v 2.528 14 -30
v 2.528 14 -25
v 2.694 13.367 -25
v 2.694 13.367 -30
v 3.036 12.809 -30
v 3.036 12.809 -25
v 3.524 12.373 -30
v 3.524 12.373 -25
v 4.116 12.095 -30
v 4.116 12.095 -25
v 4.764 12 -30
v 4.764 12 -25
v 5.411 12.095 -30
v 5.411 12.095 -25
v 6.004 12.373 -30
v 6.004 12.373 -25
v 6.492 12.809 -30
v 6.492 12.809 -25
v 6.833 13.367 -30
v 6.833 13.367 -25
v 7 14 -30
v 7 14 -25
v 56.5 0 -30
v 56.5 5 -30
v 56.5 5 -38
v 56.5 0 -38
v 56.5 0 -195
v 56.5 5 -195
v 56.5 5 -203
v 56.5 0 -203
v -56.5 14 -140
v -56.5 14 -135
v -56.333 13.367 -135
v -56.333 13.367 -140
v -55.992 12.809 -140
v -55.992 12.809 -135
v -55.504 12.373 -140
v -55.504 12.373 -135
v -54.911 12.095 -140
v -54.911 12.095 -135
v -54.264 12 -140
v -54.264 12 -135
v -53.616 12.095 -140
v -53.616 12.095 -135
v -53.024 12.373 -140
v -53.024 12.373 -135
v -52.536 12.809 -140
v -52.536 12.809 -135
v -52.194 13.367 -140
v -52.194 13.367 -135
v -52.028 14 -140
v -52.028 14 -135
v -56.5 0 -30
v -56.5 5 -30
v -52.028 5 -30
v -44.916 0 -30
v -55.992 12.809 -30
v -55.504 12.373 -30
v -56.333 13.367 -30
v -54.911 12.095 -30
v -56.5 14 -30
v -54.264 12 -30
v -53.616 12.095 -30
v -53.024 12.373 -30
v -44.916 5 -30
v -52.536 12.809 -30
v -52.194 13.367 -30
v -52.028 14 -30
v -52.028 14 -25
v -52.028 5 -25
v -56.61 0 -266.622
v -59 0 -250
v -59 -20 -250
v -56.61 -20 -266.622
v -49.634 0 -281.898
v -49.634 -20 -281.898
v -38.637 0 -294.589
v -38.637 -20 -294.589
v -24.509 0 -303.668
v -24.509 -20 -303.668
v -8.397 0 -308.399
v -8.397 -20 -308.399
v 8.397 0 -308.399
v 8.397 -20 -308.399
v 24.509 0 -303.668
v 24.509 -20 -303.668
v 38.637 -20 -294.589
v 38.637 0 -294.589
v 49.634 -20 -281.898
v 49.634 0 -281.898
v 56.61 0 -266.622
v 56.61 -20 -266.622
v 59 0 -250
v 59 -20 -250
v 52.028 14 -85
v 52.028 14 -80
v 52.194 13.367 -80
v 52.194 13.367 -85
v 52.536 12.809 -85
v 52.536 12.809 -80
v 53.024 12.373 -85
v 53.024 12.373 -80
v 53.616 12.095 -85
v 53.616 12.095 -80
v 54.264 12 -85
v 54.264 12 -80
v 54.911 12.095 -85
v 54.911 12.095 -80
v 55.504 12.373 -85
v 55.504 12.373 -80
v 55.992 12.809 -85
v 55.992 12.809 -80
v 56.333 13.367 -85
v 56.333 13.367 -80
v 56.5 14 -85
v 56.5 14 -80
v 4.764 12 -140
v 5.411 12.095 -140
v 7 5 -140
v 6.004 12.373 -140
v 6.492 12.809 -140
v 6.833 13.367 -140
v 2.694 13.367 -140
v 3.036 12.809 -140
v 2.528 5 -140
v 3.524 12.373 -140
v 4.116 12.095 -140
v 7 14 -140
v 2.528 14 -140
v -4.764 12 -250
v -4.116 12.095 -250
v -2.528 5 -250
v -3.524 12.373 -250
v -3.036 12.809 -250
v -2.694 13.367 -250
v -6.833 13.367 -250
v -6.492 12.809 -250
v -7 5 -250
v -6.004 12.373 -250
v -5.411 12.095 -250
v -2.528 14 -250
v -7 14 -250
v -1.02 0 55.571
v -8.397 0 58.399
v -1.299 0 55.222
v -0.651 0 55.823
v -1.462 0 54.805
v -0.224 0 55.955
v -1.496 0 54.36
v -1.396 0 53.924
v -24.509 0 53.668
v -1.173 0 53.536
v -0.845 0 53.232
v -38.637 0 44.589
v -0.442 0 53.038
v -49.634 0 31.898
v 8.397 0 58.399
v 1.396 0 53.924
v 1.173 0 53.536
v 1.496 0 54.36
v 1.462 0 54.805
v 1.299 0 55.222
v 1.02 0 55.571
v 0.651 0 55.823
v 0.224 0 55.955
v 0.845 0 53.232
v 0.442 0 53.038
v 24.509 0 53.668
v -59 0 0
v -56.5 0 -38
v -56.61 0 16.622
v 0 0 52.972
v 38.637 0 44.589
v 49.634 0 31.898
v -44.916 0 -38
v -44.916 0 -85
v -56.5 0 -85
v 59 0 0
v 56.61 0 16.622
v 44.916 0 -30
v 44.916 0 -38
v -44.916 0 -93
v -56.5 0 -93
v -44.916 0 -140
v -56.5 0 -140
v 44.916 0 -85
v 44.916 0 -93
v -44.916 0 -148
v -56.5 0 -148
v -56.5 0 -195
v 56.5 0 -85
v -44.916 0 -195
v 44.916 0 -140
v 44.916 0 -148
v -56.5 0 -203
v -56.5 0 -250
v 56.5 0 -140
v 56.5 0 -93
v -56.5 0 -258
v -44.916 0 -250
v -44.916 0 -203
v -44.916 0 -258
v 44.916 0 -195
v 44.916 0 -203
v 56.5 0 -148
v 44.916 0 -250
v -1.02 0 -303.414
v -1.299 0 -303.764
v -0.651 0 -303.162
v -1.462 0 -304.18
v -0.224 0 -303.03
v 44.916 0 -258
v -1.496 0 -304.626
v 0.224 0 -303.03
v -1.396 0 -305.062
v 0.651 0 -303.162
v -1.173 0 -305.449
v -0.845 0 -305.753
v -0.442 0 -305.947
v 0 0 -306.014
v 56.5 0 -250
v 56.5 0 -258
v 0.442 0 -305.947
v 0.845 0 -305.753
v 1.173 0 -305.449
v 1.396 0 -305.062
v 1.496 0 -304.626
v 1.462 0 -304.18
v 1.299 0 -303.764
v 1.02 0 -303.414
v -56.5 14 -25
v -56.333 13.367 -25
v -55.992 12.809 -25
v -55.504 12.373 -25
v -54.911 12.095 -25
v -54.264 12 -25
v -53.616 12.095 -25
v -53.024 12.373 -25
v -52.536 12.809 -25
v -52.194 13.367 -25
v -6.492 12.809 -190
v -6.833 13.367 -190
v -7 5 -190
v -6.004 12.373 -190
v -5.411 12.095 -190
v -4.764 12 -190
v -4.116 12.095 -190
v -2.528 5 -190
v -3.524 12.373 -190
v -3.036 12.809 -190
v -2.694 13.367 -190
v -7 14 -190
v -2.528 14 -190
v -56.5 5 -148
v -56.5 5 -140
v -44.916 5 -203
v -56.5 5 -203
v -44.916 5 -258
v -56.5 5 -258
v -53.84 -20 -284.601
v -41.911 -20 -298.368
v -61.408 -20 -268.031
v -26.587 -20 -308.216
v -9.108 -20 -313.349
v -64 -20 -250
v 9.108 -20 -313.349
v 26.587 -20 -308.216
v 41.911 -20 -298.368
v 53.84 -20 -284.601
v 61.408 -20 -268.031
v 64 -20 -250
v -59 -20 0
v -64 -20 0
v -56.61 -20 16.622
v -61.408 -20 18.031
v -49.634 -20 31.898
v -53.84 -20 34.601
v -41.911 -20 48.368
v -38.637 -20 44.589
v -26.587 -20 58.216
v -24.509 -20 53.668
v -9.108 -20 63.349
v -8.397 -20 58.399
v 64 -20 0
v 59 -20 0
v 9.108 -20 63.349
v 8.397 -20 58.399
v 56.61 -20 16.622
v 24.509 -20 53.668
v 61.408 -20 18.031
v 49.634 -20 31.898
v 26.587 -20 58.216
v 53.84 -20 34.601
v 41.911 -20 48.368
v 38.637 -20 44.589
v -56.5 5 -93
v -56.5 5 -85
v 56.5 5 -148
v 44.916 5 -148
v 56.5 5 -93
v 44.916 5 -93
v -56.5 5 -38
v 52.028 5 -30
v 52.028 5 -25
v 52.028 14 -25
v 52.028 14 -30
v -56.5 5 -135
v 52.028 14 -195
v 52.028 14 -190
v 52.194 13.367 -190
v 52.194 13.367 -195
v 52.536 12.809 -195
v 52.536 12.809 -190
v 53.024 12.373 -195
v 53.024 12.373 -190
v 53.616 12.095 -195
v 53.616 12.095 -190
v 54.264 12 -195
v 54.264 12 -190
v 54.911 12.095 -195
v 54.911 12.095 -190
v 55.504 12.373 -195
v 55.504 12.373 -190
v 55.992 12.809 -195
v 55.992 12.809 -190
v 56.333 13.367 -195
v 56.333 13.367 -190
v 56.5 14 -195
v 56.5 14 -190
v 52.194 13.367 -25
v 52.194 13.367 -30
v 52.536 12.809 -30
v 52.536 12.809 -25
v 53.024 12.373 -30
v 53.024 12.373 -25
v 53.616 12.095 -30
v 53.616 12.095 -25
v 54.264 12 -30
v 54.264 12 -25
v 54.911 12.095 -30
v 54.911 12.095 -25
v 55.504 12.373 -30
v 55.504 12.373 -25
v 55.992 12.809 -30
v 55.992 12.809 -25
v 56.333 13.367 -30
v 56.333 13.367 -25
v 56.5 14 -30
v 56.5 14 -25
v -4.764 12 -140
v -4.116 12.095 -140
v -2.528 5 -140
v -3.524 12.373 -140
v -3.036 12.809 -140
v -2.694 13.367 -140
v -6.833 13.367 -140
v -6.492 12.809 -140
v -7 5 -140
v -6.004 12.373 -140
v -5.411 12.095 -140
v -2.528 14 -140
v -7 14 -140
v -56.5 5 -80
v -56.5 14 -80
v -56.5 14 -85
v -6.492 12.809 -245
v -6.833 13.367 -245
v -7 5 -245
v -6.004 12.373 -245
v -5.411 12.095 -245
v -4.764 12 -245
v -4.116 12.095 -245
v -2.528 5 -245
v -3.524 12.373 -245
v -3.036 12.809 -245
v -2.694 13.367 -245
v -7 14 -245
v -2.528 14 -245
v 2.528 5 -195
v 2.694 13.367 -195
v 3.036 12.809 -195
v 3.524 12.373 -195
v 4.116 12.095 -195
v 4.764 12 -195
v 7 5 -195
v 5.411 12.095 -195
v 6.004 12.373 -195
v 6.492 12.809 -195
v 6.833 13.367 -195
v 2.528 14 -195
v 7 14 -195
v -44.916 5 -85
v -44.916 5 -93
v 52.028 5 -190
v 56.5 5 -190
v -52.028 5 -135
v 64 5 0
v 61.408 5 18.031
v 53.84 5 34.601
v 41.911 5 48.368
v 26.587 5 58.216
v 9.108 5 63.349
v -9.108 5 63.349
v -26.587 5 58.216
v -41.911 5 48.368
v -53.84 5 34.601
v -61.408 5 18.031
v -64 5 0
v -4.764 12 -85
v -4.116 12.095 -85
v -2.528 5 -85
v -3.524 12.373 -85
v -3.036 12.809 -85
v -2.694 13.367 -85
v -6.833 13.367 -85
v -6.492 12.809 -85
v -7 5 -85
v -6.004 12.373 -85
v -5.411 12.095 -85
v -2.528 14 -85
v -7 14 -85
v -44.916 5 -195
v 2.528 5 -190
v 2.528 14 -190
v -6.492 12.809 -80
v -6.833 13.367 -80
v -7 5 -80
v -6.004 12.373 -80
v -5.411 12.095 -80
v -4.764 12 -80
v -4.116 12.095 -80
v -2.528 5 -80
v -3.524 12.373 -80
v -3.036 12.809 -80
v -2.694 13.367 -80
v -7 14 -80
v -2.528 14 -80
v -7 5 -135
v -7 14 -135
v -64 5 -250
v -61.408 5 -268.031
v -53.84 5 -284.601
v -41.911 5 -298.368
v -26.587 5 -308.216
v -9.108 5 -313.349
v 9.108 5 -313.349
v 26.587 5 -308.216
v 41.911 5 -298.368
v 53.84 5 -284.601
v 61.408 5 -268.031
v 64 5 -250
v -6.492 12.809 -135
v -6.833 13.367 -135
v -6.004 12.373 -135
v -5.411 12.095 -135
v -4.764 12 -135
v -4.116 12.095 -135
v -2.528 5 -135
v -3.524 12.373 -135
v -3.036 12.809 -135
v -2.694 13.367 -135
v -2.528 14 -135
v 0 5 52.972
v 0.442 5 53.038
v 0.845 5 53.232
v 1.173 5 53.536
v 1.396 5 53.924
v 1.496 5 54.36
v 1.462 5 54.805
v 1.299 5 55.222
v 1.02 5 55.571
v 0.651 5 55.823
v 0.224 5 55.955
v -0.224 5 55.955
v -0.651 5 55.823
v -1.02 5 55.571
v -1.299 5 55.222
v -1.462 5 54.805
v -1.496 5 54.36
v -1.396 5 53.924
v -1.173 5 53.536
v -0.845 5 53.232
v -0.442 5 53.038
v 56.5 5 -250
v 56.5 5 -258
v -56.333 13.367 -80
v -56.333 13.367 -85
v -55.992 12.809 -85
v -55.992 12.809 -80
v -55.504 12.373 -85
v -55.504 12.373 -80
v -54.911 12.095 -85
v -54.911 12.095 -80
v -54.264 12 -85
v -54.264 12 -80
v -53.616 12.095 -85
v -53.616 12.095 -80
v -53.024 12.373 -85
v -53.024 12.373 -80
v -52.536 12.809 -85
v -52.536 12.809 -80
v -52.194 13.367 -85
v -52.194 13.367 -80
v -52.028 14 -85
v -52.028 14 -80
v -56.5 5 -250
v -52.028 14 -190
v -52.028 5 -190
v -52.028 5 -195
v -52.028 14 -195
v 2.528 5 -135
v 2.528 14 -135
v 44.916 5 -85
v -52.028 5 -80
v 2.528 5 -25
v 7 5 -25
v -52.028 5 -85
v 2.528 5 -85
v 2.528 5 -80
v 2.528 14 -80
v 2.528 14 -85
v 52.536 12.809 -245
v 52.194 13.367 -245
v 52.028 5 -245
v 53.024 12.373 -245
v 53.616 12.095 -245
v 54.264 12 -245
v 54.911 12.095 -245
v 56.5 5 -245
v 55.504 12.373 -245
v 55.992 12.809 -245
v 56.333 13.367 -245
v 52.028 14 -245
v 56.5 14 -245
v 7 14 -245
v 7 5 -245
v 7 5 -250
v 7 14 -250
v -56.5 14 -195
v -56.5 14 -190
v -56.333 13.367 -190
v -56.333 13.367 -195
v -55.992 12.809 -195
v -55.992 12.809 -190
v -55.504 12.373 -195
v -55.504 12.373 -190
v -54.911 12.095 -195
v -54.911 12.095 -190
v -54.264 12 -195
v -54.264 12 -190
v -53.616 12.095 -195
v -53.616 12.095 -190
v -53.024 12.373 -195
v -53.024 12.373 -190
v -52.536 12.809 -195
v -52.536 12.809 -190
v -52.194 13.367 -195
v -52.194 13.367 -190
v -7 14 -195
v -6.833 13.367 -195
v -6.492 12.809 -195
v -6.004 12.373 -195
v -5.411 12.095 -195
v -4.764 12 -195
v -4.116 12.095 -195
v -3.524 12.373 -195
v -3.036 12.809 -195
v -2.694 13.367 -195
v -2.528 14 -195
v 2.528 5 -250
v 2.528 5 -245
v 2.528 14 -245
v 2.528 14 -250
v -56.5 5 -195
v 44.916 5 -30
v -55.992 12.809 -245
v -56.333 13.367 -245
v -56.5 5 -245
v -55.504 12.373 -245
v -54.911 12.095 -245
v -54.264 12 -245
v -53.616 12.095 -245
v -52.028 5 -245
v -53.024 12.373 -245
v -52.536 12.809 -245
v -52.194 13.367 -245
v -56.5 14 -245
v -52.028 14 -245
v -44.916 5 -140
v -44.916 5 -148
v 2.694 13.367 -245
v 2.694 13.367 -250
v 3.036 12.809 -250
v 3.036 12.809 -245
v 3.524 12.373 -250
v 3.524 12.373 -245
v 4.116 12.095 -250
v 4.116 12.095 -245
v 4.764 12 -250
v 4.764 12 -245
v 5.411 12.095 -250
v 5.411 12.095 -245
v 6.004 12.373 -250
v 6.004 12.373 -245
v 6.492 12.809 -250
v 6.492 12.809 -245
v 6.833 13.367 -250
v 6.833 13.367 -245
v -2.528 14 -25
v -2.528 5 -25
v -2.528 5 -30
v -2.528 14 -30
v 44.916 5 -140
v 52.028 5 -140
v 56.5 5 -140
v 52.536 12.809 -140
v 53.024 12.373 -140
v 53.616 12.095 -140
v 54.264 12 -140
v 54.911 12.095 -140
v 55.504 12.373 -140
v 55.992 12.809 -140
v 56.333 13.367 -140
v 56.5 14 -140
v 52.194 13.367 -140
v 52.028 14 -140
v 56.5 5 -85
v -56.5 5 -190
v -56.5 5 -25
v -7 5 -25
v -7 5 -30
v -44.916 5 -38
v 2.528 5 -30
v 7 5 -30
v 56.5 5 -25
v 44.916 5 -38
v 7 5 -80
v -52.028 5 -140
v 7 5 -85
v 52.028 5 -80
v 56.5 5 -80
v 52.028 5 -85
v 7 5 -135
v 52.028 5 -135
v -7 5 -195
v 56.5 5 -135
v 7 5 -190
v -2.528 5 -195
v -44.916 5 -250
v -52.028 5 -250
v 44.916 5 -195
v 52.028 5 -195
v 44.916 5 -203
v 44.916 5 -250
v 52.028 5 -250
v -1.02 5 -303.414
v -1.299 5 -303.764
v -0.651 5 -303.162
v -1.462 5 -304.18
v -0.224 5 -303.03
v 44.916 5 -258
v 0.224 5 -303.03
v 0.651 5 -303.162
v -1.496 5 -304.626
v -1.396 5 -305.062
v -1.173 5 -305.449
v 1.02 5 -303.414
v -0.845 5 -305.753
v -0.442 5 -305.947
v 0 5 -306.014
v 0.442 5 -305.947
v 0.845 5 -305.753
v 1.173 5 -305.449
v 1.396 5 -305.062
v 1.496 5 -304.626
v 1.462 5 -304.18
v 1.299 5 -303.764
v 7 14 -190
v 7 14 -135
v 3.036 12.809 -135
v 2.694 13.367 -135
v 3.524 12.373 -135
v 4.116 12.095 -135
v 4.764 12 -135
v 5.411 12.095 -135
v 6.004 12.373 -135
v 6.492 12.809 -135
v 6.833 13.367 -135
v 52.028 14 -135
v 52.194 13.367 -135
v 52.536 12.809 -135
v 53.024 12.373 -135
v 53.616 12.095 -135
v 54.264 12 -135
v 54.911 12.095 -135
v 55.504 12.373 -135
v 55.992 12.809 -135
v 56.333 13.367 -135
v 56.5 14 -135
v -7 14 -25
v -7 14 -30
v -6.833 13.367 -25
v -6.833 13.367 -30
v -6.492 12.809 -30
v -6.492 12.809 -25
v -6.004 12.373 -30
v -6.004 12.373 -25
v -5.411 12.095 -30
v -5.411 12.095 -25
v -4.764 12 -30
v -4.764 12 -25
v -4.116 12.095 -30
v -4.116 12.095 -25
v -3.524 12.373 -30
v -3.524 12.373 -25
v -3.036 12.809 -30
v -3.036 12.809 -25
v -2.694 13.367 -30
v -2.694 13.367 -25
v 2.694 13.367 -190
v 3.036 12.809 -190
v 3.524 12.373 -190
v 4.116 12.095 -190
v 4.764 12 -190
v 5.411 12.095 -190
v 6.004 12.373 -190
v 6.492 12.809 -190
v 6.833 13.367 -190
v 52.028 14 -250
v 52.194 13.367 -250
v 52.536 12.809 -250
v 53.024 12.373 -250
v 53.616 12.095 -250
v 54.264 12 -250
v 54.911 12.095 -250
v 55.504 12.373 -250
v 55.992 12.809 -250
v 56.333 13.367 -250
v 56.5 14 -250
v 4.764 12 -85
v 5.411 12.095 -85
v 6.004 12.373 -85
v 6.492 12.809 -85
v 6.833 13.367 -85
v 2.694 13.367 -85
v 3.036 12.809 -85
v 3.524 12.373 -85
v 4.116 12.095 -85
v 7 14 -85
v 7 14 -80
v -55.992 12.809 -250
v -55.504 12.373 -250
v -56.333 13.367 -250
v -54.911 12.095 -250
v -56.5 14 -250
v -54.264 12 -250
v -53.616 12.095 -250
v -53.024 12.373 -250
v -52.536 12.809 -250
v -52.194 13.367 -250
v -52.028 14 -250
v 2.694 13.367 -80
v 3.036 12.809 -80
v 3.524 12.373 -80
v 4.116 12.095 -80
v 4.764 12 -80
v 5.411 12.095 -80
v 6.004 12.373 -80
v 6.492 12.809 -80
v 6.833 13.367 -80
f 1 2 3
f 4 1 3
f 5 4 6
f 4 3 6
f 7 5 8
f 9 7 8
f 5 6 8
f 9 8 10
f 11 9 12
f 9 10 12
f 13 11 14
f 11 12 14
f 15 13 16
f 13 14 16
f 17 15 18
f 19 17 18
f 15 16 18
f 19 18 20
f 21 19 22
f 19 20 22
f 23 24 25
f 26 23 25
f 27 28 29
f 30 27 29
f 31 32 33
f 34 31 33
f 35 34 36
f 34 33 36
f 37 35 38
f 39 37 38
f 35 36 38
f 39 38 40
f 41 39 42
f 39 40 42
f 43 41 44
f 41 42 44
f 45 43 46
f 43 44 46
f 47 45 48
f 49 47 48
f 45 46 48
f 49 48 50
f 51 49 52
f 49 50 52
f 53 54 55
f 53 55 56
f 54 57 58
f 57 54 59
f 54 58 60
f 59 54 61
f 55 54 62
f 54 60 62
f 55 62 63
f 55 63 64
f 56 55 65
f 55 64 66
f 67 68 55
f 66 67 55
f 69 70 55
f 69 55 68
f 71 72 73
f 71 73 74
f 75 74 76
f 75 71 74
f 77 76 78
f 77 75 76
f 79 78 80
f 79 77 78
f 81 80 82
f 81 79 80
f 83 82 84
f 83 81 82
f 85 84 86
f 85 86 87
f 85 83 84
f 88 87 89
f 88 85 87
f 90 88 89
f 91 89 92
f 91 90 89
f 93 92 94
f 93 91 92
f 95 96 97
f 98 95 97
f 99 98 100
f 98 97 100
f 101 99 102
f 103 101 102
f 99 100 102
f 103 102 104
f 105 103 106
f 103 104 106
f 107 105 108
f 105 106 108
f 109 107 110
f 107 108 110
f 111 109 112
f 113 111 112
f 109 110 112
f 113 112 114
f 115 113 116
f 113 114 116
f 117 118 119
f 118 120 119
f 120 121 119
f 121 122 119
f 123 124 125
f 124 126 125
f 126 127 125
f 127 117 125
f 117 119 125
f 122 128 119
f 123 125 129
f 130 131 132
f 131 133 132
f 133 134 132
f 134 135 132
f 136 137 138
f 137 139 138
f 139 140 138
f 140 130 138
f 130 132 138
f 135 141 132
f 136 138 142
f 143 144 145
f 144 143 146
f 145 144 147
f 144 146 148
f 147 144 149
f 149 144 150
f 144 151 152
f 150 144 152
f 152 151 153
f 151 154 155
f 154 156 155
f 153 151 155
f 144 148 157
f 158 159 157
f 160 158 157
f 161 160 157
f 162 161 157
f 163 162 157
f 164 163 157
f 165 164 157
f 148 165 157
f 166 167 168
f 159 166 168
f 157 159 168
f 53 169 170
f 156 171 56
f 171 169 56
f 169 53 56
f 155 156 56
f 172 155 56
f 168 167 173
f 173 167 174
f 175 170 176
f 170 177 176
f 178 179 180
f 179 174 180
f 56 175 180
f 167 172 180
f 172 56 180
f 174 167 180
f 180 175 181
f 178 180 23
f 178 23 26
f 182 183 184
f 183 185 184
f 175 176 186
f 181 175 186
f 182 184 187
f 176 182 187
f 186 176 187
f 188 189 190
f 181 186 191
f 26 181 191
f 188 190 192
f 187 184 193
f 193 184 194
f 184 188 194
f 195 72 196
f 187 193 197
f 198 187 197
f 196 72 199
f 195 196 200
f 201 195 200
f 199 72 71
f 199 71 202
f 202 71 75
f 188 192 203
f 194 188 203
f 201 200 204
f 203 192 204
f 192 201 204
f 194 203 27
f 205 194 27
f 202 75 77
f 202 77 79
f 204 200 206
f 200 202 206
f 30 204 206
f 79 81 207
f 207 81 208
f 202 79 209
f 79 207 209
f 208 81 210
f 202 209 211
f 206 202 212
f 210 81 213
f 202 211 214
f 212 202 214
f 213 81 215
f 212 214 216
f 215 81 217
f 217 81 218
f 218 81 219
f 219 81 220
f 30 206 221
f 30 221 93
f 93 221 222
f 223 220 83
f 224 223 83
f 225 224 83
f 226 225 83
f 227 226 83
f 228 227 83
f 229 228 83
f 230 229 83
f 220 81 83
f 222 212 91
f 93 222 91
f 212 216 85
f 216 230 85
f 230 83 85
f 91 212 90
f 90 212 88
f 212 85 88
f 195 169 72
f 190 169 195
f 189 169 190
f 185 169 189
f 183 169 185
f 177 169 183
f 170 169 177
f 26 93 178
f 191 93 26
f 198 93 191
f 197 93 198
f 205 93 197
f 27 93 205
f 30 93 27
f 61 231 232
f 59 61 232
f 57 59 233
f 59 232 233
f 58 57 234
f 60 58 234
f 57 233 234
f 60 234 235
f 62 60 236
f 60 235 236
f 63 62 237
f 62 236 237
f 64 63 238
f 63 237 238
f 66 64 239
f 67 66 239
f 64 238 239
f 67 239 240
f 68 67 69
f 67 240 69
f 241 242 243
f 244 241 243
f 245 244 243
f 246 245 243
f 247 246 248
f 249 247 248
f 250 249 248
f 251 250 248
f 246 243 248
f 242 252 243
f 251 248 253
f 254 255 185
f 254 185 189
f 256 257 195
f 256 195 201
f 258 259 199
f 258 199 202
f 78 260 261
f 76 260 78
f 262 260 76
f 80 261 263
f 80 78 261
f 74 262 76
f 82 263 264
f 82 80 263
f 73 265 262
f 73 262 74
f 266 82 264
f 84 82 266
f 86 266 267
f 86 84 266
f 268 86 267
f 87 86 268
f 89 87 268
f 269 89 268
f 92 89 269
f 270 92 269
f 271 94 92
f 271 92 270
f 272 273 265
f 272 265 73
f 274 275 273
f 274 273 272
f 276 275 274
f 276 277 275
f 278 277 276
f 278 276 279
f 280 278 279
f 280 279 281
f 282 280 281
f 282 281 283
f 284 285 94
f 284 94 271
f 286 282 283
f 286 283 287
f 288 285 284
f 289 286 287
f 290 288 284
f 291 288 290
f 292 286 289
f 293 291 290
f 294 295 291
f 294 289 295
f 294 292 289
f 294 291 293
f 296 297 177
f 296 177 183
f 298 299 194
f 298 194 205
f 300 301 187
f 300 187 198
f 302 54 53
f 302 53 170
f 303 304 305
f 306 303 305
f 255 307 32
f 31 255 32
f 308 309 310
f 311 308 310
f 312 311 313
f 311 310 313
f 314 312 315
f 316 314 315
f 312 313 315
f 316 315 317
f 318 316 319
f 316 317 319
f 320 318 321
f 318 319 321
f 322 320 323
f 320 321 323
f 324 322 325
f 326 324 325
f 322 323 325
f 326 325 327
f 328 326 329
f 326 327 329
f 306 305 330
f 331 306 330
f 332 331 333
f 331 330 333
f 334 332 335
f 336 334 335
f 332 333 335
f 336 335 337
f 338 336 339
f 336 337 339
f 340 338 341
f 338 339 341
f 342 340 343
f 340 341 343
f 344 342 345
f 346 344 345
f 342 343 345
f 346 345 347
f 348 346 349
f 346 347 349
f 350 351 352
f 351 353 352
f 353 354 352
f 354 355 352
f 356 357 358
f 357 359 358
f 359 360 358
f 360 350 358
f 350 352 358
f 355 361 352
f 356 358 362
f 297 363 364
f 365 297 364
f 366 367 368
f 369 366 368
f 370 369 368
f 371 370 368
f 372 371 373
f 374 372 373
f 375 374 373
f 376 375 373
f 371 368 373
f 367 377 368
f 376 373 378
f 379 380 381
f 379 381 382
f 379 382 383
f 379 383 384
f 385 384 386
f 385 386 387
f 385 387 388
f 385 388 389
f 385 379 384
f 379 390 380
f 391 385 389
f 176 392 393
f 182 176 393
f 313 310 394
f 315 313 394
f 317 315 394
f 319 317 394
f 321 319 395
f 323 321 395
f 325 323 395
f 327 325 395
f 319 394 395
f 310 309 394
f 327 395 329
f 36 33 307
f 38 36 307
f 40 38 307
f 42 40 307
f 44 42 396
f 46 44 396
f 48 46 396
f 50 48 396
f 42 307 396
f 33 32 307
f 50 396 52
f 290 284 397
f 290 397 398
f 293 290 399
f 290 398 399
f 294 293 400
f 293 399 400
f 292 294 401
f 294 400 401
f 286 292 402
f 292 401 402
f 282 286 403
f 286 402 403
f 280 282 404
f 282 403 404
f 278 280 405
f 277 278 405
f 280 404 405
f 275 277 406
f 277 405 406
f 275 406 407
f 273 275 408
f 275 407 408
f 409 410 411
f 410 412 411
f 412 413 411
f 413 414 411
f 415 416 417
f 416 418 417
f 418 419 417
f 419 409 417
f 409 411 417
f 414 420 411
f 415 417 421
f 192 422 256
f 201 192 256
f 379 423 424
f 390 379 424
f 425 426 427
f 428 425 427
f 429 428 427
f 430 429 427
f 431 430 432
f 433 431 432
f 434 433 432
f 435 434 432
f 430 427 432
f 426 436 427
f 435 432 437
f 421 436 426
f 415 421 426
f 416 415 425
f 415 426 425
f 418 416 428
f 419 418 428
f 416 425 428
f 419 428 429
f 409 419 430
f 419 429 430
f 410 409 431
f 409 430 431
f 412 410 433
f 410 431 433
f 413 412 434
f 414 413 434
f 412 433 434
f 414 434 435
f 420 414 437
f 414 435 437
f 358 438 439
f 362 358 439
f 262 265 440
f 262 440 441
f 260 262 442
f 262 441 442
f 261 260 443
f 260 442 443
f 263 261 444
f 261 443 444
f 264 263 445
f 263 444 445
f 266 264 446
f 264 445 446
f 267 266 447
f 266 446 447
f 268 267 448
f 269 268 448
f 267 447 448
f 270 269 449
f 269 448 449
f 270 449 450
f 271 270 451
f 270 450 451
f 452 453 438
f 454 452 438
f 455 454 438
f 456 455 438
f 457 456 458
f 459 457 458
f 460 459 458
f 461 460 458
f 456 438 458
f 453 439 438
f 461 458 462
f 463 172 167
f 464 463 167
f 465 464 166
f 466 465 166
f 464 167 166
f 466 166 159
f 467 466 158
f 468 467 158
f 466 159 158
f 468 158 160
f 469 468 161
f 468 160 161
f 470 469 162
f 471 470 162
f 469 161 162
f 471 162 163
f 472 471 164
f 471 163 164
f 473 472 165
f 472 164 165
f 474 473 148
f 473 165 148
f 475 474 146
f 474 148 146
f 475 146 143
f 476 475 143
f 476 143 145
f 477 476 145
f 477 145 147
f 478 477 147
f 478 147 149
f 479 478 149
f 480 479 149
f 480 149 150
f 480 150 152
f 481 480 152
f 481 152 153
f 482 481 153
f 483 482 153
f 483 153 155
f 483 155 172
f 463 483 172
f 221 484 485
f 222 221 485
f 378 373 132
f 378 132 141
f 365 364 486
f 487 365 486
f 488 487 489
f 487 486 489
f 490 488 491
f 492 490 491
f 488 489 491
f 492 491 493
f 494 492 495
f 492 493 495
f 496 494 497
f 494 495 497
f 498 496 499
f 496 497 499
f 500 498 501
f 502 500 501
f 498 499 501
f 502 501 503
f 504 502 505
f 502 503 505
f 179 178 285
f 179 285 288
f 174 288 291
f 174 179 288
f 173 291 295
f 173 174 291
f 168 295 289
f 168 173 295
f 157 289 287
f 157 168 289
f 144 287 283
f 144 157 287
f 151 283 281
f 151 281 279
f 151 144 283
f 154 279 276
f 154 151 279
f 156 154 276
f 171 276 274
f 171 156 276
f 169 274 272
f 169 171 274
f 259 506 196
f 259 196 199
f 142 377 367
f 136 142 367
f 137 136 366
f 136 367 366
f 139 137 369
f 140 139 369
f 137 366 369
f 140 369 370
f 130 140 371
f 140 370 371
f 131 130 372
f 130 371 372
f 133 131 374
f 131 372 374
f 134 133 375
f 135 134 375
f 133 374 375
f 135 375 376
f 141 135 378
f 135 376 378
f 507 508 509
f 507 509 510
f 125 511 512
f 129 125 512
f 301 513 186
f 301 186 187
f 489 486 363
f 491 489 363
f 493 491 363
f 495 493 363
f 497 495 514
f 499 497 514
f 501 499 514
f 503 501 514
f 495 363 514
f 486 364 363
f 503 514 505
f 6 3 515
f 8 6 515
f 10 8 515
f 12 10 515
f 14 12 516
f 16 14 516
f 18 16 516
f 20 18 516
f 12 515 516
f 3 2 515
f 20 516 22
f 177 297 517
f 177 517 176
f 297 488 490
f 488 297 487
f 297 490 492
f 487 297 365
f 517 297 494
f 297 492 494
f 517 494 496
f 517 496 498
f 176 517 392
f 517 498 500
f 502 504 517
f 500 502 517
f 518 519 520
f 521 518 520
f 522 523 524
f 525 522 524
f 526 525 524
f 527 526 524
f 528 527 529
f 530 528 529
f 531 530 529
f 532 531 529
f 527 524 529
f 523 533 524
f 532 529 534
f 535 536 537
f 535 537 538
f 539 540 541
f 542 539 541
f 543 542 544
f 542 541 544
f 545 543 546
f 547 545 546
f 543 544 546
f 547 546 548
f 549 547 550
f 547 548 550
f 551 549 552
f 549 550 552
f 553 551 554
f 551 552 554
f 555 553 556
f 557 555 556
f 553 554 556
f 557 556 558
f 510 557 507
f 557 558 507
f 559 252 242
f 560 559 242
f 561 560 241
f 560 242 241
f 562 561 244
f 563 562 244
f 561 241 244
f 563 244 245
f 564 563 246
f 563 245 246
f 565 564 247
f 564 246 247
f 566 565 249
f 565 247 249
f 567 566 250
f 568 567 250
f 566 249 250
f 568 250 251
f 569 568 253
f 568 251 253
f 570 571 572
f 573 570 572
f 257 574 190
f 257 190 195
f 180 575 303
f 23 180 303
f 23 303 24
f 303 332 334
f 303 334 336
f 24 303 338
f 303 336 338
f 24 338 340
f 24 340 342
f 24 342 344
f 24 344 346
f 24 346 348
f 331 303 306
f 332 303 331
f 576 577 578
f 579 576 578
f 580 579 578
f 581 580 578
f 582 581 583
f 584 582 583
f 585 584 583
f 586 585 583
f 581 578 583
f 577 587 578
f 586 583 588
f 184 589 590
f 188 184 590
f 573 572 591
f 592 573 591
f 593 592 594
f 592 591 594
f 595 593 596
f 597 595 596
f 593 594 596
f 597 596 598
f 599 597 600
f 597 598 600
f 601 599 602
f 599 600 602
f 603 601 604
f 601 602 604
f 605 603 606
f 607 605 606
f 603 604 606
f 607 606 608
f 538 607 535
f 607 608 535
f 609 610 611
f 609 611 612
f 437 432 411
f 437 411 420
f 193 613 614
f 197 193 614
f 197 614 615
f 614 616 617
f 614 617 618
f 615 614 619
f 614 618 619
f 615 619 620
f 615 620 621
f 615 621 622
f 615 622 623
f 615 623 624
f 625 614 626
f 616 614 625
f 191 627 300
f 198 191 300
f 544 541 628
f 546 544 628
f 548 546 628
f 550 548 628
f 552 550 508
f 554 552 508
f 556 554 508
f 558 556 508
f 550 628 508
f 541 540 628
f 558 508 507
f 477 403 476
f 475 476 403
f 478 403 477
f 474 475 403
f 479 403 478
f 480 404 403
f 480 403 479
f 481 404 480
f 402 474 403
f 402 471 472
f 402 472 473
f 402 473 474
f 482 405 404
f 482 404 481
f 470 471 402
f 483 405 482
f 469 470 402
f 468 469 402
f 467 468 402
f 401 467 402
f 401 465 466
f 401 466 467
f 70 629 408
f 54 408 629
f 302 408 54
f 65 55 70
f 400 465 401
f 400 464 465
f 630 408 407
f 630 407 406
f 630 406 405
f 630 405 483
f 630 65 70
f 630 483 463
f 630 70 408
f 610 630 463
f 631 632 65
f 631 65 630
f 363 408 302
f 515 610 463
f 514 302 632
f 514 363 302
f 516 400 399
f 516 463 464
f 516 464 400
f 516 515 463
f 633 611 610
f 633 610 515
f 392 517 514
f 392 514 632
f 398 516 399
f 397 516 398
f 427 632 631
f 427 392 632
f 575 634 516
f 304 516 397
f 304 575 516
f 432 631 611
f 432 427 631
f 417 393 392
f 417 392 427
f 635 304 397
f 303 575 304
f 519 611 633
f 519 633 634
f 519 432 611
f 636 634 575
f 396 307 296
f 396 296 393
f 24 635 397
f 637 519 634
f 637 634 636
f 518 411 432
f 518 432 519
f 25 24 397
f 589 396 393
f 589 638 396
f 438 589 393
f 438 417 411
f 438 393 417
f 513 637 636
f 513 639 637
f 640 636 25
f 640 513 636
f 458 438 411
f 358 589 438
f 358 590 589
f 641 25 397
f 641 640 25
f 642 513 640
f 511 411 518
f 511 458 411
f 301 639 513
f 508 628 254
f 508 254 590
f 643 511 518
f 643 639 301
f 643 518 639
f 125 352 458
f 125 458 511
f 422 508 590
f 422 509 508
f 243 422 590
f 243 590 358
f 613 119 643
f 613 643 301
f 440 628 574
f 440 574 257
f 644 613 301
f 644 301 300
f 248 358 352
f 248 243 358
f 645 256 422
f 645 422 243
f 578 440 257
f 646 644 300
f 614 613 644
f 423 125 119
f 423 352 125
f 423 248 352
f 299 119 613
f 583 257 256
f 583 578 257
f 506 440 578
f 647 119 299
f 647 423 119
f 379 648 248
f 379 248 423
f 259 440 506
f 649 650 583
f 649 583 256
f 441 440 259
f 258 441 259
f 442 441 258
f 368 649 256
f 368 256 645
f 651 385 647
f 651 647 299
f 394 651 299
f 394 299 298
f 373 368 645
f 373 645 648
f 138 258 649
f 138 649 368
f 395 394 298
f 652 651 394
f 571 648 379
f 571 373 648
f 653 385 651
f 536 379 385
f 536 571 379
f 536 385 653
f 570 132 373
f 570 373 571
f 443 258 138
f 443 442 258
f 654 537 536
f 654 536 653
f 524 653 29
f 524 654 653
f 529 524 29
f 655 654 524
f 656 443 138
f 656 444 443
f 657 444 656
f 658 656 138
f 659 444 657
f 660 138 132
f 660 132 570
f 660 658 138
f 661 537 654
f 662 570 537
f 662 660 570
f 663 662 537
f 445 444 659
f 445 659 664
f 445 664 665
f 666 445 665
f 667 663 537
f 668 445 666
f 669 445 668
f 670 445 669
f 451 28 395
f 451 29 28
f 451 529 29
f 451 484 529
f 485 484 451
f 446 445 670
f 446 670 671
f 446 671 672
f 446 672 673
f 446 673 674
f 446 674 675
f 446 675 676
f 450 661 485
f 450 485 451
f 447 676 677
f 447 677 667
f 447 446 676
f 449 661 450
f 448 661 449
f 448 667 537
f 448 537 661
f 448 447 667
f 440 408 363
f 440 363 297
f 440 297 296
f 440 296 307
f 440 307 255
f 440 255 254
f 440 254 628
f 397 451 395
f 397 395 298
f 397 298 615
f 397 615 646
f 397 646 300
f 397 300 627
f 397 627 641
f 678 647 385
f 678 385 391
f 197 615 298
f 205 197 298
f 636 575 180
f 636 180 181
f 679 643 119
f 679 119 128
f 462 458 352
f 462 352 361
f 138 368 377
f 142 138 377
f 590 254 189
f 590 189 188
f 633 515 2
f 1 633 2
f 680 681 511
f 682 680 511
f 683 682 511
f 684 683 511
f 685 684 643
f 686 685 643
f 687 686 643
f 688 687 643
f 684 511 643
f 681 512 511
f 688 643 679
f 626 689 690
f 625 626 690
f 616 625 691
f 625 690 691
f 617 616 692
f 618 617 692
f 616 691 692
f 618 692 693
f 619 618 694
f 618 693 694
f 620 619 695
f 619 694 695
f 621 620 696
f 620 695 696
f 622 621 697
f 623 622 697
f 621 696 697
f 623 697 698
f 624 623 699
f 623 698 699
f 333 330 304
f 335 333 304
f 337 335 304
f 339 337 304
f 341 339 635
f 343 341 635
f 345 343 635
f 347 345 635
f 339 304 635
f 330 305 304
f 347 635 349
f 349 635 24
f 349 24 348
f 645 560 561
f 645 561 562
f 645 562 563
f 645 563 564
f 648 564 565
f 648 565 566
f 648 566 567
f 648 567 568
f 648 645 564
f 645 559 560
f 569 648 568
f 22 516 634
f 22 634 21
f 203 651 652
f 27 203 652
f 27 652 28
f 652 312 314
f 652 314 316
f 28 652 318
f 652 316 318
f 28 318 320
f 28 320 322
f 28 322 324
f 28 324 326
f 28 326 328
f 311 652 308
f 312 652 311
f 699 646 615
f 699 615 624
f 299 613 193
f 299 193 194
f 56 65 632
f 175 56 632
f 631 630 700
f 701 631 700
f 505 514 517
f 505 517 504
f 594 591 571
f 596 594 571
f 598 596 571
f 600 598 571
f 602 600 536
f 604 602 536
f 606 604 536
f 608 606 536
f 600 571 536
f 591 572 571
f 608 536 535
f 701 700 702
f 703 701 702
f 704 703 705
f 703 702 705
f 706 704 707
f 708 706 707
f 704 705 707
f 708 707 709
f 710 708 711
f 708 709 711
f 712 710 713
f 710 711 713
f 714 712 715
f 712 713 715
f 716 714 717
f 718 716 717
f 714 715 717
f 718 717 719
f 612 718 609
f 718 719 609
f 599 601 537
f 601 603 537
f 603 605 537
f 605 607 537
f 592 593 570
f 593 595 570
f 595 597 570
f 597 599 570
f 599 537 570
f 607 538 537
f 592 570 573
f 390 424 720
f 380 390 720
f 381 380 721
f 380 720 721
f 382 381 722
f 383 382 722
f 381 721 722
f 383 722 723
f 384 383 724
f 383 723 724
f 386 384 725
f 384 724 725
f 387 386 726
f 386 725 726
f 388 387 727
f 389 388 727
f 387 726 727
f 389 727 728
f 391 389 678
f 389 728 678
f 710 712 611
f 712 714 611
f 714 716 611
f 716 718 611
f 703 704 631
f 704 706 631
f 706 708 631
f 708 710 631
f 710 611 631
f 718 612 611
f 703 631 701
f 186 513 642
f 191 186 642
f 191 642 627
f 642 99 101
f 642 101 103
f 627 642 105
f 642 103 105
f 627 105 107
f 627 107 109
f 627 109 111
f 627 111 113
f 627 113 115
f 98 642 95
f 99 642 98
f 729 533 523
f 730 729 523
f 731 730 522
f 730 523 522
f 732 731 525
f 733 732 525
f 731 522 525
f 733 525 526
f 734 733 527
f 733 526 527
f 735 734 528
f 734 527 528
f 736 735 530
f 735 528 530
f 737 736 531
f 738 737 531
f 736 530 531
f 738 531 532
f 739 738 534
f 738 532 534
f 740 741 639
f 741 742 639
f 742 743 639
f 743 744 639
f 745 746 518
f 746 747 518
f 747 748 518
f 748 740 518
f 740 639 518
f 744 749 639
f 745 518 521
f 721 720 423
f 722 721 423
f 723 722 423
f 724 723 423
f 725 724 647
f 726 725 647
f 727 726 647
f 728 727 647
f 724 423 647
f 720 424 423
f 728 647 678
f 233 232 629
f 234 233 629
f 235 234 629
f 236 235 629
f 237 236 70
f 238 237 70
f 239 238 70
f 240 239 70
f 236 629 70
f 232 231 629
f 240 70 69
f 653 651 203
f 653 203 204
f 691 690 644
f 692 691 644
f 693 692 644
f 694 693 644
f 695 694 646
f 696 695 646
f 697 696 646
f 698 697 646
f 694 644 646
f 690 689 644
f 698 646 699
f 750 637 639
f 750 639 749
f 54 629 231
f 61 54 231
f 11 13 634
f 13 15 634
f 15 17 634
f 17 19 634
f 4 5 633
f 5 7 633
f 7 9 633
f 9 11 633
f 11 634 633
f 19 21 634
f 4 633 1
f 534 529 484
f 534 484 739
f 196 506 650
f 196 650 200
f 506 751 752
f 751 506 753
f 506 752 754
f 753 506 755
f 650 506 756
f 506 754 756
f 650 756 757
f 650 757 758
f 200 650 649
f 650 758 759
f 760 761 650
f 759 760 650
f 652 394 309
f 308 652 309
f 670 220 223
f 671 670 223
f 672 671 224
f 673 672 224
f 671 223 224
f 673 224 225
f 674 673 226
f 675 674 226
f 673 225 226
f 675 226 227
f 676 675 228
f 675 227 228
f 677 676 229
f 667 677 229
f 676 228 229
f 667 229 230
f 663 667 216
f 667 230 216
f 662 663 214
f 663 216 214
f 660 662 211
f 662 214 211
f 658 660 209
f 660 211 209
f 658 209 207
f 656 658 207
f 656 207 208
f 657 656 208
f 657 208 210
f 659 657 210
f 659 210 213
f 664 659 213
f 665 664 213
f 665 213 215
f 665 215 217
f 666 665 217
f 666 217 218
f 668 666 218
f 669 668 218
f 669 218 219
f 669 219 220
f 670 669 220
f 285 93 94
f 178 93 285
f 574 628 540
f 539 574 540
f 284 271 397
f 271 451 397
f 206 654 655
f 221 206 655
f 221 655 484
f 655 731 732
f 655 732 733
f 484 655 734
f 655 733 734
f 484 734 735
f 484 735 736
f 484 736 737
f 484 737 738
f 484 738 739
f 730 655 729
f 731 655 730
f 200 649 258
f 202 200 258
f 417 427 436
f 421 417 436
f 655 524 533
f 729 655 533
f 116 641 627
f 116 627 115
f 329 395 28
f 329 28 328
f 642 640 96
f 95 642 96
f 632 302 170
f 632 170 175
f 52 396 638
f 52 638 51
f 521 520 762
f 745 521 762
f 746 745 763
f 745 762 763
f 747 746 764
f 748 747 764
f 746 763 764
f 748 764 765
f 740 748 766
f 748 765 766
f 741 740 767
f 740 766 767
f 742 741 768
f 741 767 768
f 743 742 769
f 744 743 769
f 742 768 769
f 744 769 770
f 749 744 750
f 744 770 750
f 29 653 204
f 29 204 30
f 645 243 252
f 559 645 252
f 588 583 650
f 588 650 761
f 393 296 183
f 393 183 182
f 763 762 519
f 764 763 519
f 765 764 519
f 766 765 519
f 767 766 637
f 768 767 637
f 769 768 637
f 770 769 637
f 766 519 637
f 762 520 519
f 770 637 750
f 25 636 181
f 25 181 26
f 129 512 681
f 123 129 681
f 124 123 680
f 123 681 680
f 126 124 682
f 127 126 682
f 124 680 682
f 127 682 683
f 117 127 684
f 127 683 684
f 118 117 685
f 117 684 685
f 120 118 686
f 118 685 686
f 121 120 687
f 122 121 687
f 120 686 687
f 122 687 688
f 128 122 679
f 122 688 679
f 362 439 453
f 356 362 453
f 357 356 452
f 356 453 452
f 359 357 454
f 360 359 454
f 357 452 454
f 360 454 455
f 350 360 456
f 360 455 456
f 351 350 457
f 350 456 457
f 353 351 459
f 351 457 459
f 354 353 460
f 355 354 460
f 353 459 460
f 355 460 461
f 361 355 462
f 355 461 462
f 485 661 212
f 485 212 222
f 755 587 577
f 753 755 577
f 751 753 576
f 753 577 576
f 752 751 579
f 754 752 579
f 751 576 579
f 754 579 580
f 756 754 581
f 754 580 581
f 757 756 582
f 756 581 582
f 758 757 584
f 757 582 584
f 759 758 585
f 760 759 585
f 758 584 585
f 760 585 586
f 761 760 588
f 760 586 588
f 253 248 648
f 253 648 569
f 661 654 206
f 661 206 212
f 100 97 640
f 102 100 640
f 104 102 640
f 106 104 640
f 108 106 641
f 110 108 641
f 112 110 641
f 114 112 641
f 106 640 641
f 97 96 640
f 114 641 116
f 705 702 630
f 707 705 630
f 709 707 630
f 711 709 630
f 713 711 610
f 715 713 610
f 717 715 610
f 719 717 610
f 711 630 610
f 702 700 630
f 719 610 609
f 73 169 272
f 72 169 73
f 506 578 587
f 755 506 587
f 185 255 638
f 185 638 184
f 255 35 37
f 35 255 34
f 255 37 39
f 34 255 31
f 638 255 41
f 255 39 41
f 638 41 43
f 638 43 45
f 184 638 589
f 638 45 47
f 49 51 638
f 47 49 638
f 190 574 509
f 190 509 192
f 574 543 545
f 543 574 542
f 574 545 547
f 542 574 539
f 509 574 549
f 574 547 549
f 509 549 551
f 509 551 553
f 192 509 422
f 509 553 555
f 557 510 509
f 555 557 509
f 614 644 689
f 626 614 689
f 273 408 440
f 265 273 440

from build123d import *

# Parameters (mm, degrees)
BOSS_EXTRUDE1_DEPTH = 5
SKETCH2_W           = 9
SKETCH2_H           = 5
SKETCH2_W_2         = 18
BOSS_EXTRUDE2_DEPTH = 9
SKETCH3_W           = 1.5
SKETCH3_H           = 9
SKETCH3_W_2         = 3.027864045
SKETCH3_W_3         = 2
SKETCH3_W_4         = 5.05572809
CUT_EXTRUDE1_DEPTH  = 228
BOSS_EXTRUDE3_DEPTH = 20
SKETCH5_W           = 11.583853266
SKETCH5_H           = 8
CUT_EXTRUDE3_DEPTH  = 20
SKETCH6_R           = 1.5
CUT_EXTRUDE5_DEPTH  = 25


with BuildPart() as part:
    # Sketch1 → Boss-Extrude1 (new body)
    with BuildSketch(Plane(origin=(0, 0, 0), x_dir=(1, 0, 0), z_dir=(0, 1, 0))):
        with BuildLine():
            Line((-64, 250), (-64, 0))
            ThreePointArc((-64, 0), (0, -64), (64, 0))
            Line((64, 0), (64, 250))
            ThreePointArc((64, 250), (0, 314), (-64, 250))
        make_face()
    extrude(amount=BOSS_EXTRUDE1_DEPTH)

    # Sketch2 → Boss-Extrude2 (add)
    with BuildSketch(Plane(origin=(0, 5, 0), x_dir=(1, 0, 0), z_dir=(0, 1, 0))):
        with Locations((4.5, 27.5)):
            Rectangle(SKETCH2_W, SKETCH2_H)
        with Locations((-4.5, 27.5)):
            Rectangle(SKETCH2_W, SKETCH2_H)
        with Locations((-53.5, 27.5)):
            Rectangle(SKETCH2_W, SKETCH2_H)
        with Locations((53.5, 27.5)):
            Rectangle(SKETCH2_W, SKETCH2_H)
        with Locations((53.5, 82.5)):
            Rectangle(SKETCH2_W, SKETCH2_H)
        with Locations((4.5, 82.5)):
            Rectangle(SKETCH2_W, SKETCH2_H)
        with Locations((-4.5, 82.5)):
            Rectangle(SKETCH2_W, SKETCH2_H)
        with Locations((-53.5, 82.5)):
            Rectangle(SKETCH2_W, SKETCH2_H)
        with Locations((-53.5, 137.5)):
            Rectangle(SKETCH2_W, SKETCH2_H)
        with Locations((-4.5, 137.5)):
            Rectangle(SKETCH2_W, SKETCH2_H)
        with Locations((4.5, 137.5)):
            Rectangle(SKETCH2_W, SKETCH2_H)
        with Locations((53.5, 137.5)):
            Rectangle(SKETCH2_W, SKETCH2_H)
        with Locations((53.5, 192.5)):
            Rectangle(SKETCH2_W, SKETCH2_H)
        with Locations((-53.5, 192.5)):
            Rectangle(SKETCH2_W, SKETCH2_H)
        with Locations((-53.5, 247.5)):
            Rectangle(SKETCH2_W, SKETCH2_H)
        with Locations((-4.5, 247.5)):
            Rectangle(SKETCH2_W, SKETCH2_H)
        with Locations((4.5, 247.5)):
            Rectangle(SKETCH2_W, SKETCH2_H)
        with Locations((53.5, 247.5)):
            Rectangle(SKETCH2_W, SKETCH2_H)
        with Locations((0, 192.5)):
            Rectangle(SKETCH2_W_2, SKETCH2_H)
    extrude(amount=BOSS_EXTRUDE2_DEPTH)

    # Sketch3 → Cut-Extrude1 (cut)
    with BuildSketch(Plane.XY.offset(-25)):
        with BuildLine():
            ThreePointArc((-56.5, 14), (-54.263932023, 12), (-52.027864045, 14))
            Line((-52.027864045, 14), (-56.5, 14))
        make_face()
        with Locations((-57.25, 9.5)):
            Rectangle(SKETCH3_W, SKETCH3_H)
        with Locations((-50.513932023, 9.5)):
            Rectangle(SKETCH3_W_2, SKETCH3_H)
        with Locations((-8, 9.5)):
            Rectangle(SKETCH3_W_3, SKETCH3_H)
        with BuildLine():
            Line((-2.527864045, 14), (-7, 14))
            ThreePointArc((-7, 14), (-4.763932023, 12), (-2.527864045, 14))
        make_face()
        with Locations((0, 9.5)):
            Rectangle(SKETCH3_W_4, SKETCH3_H)
        with BuildLine():
            Line((7, 14), (2.527864045, 14))
            ThreePointArc((2.527864045, 14), (4.763932023, 12), (7, 14))
        make_face()
        with Locations((8, 9.5)):
            Rectangle(SKETCH3_W_3, SKETCH3_H)
        with Locations((50.513932023, 9.5)):
            Rectangle(SKETCH3_W_2, SKETCH3_H)
        with BuildLine():
            Line((56.5, 14), (52.027864045, 14))
            ThreePointArc((52.027864045, 14), (54.263932023, 12), (56.5, 14))
        make_face()
        with Locations((57.25, 9.5)):
            Rectangle(SKETCH3_W, SKETCH3_H)
    extrude(amount=-CUT_EXTRUDE1_DEPTH, mode=Mode.SUBTRACT)

    # Sketch4 → Boss-Extrude3 (add)
    with BuildSketch(Plane.XZ):
        with BuildLine():
            Line((-64, 0), (-64, -250))
            ThreePointArc((-64, -250), (0, -314), (64, -250))
            Line((64, -250), (64, 0))
            ThreePointArc((64, 0), (0, 64), (-64, 0))
        make_face()
        with BuildLine():
            Line((-59, 0), (-59, -250))
            ThreePointArc((-59, -250), (0, -309), (59, -250))
            Line((59, -250), (59, 0))
            ThreePointArc((59, 0), (0, 59), (-59, 0))
        make_face(mode=Mode.SUBTRACT)
    extrude(amount=BOSS_EXTRUDE3_DEPTH)

    # Sketch5 → Cut-Extrude3 (cut)
    with BuildSketch(Plane(origin=(0, 5, 0), x_dir=(1, 0, 0), z_dir=(0, 1, 0))):
        with Locations((-50.708073367, 254)):
            Rectangle(SKETCH5_W, SKETCH5_H)
        with Locations((-50.708073367, 199)):
            Rectangle(SKETCH5_W, SKETCH5_H)
        with Locations((-50.708073367, 144)):
            Rectangle(SKETCH5_W, SKETCH5_H)
        with Locations((-50.708073367, 89)):
            Rectangle(SKETCH5_W, SKETCH5_H)
        with Locations((-50.708073367, 34)):
            Rectangle(SKETCH5_W, SKETCH5_H)
        with Locations((50.708073367, 144)):
            Rectangle(SKETCH5_W, SKETCH5_H)
        with Locations((50.708073367, 199)):
            Rectangle(SKETCH5_W, SKETCH5_H)
        with Locations((50.708073367, 254)):
            Rectangle(SKETCH5_W, SKETCH5_H)
        with Locations((50.708073367, 89)):
            Rectangle(SKETCH5_W, SKETCH5_H)
        with Locations((50.708073367, 34)):
            Rectangle(SKETCH5_W, SKETCH5_H)
    extrude(amount=-CUT_EXTRUDE3_DEPTH, mode=Mode.SUBTRACT)

    # Sketch6 → Cut-Extrude5 (cut)
    with BuildSketch(Plane.XZ):
        with Locations(Location((0, 54.47166112, 0), (0, 0, 270))):
            Circle(SKETCH6_R)
        with Locations(Location((0, -304.513619398, 0), (0, 0, 270))):
            Circle(SKETCH6_R)
    extrude(amount=-CUT_EXTRUDE5_DEPTH, mode=Mode.SUBTRACT)


solid = part.part
